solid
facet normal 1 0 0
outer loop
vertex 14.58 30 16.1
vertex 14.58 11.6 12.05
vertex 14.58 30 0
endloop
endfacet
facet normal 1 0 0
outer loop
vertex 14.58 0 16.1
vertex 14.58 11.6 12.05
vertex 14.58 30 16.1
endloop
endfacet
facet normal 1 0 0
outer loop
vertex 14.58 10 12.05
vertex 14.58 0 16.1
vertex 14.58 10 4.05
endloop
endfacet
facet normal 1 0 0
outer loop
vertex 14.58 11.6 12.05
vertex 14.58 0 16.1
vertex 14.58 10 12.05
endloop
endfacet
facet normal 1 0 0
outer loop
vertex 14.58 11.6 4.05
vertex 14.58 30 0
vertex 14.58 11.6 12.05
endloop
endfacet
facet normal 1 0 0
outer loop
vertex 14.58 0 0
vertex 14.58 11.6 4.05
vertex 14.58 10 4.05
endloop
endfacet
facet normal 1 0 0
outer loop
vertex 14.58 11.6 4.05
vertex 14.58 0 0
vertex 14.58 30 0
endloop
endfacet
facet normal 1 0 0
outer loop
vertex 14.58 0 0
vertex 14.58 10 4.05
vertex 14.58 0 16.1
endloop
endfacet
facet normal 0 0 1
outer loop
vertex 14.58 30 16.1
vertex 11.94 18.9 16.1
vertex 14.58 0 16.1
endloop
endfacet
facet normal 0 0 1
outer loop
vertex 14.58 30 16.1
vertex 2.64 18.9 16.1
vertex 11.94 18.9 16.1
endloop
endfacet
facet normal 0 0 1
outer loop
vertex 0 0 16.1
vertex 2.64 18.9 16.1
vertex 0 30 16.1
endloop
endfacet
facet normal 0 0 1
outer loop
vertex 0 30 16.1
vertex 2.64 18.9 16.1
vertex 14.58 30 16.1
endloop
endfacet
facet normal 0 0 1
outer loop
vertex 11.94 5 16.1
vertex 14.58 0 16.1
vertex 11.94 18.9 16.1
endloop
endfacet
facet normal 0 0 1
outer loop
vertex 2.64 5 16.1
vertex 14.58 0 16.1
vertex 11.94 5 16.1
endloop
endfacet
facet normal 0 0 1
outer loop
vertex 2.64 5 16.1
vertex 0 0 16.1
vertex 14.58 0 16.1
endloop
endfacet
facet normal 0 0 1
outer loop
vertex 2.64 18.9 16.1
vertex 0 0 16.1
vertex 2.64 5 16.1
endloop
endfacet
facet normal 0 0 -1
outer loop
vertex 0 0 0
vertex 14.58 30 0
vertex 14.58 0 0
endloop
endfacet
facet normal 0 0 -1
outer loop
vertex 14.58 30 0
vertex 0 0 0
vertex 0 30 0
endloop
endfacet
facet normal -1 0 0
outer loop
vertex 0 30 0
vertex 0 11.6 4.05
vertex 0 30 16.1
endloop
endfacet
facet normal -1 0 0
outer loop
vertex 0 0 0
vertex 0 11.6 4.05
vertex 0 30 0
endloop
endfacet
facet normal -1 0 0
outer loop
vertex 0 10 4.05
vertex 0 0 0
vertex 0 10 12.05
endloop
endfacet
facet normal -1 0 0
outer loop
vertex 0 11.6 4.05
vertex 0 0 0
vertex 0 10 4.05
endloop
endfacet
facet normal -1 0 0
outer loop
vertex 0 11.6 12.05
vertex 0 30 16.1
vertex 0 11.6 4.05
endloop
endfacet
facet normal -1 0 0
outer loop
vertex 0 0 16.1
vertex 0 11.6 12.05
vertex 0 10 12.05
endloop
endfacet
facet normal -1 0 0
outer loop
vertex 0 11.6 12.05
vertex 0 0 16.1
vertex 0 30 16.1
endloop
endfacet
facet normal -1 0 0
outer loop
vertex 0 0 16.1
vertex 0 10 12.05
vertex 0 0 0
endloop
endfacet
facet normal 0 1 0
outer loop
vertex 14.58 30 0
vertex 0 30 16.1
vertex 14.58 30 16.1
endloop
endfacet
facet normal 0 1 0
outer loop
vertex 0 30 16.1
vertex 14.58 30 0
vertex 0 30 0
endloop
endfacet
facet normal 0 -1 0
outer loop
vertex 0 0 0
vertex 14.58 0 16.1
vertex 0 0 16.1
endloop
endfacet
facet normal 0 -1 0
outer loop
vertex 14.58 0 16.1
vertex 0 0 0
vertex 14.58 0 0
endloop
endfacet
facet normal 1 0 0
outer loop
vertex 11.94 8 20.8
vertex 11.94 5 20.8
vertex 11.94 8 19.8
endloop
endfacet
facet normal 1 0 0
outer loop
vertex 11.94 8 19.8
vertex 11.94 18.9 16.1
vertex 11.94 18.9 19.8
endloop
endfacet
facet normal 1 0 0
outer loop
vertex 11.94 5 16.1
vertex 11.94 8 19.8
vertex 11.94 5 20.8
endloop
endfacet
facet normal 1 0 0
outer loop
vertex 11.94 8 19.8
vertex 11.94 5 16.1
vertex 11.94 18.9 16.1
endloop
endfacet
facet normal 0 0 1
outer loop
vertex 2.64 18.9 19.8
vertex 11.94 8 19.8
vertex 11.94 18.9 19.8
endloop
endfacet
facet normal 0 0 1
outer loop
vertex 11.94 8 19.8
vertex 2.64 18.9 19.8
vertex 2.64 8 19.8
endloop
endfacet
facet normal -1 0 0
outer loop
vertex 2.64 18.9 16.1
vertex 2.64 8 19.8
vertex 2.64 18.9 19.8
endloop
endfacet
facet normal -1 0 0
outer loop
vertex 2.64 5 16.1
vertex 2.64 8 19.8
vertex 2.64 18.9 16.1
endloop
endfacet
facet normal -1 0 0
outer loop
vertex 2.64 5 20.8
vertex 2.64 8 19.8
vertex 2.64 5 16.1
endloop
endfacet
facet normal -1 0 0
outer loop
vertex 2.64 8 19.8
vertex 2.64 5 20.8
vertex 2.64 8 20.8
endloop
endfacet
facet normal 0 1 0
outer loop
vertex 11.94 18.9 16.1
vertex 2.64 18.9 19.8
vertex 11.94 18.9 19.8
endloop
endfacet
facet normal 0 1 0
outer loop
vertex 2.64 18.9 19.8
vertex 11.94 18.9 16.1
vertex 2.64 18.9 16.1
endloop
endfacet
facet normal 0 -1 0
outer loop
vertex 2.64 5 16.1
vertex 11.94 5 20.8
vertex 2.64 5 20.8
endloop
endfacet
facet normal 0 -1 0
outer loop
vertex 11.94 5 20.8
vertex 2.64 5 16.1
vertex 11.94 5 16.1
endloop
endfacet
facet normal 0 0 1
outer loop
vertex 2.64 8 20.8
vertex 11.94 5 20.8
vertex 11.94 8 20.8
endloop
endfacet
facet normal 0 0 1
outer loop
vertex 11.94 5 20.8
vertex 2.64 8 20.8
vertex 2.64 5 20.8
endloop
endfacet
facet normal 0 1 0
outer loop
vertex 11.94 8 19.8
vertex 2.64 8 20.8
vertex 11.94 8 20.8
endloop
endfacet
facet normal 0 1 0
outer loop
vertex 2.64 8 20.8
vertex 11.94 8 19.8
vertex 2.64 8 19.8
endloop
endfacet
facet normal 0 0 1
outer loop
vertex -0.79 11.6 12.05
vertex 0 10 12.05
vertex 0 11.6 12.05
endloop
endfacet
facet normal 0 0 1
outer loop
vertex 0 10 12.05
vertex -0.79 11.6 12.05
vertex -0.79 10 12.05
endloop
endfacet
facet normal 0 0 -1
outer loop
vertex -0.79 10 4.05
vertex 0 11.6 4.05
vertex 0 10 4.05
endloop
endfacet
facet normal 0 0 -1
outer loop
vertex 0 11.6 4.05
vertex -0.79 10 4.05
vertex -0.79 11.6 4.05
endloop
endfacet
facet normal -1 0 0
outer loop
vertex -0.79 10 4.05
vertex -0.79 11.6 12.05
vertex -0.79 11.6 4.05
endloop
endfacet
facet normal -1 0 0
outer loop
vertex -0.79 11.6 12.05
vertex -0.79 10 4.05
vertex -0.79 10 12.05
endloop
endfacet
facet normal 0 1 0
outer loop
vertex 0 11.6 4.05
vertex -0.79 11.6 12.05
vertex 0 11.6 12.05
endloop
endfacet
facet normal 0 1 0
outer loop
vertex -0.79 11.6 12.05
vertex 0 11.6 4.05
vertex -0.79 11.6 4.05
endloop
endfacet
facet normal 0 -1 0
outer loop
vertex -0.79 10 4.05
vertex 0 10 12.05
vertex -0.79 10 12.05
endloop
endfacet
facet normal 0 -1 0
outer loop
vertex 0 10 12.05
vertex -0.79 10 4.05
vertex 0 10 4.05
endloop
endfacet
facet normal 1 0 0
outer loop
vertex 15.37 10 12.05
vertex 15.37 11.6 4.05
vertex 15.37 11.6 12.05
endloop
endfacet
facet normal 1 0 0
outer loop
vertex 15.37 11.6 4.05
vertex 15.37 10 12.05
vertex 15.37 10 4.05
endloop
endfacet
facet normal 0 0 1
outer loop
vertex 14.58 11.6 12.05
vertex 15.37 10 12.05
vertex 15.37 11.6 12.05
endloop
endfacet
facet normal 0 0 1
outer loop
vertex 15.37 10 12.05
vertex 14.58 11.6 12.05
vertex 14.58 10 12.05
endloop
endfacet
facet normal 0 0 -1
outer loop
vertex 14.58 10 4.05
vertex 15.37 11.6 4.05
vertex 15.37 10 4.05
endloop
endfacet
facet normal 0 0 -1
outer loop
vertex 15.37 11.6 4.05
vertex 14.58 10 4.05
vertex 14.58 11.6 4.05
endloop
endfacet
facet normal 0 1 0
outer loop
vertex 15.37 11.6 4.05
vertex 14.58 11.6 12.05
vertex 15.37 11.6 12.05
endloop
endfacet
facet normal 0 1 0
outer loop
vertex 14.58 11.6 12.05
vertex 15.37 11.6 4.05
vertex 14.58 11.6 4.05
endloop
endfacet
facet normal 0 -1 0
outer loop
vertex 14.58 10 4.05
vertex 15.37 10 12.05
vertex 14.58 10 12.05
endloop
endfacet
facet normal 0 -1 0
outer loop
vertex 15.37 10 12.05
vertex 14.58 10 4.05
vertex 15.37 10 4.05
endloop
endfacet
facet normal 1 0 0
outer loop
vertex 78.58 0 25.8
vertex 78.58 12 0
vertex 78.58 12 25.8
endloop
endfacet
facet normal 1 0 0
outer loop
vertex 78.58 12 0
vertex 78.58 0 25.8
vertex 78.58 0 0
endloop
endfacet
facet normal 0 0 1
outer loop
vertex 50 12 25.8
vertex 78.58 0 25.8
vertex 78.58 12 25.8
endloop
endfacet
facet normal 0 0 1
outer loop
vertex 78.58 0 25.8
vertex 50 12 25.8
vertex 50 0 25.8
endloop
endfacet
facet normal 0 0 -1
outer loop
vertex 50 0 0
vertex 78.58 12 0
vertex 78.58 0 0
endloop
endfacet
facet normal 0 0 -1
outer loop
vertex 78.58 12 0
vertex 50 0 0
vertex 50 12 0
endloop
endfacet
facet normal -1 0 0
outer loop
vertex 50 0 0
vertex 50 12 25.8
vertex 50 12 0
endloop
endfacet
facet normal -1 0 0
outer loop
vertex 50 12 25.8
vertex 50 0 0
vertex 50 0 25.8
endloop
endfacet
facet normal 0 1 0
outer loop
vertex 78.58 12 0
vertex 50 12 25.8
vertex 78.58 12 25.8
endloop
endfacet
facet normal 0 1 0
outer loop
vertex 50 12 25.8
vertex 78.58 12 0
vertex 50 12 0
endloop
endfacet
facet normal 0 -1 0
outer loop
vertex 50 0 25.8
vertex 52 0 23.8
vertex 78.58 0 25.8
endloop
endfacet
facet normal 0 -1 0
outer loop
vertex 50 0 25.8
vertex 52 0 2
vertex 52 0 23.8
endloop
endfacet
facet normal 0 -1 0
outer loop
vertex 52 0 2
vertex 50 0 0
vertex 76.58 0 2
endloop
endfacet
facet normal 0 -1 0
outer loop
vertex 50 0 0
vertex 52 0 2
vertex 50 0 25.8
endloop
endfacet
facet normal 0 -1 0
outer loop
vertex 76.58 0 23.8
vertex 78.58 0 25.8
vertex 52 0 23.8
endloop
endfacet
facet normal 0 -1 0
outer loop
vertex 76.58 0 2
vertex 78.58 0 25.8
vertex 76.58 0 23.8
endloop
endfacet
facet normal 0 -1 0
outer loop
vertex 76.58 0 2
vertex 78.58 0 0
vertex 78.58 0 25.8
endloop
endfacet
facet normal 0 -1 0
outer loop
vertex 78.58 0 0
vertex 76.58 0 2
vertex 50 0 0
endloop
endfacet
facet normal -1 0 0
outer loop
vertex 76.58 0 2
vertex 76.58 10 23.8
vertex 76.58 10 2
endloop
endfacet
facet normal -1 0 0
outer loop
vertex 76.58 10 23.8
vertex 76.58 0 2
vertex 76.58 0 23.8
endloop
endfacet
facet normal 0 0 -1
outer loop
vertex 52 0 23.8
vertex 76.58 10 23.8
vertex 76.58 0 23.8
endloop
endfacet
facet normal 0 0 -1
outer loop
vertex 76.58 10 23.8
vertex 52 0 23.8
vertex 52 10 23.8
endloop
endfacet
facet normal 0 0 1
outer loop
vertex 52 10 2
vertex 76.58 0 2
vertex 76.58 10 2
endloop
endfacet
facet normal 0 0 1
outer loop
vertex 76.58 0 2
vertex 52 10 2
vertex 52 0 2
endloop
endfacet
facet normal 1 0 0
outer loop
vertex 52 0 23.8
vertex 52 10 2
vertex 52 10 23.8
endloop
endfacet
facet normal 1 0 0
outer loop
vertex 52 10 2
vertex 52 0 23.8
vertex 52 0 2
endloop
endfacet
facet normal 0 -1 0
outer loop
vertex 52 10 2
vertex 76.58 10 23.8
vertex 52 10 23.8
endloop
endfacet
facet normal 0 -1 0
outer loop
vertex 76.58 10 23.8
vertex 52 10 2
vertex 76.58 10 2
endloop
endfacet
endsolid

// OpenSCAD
//keystone for the tray, for routing cables from switch to stuff in the back. Just a cheap amazon keystone.
//
//
//the keystone gets inserted from the rear of the panel, not the front, so the catch clips in, the front stopper should ride
//over the panel front when the catch is squished, then prevent the keystone from being pushed back into the tray.

/*
// next 2 lines used only by my 'on save' script. can be ignored otherwise.
// AUTO-V
version = "v0.1-2026/05/07r18";
*/

ks_width = 14.580;
ks_height = 16.10;
ks_depth = 30.0;
ks_catch_height = 3.7;
ks_catch_width = 9.3;
ks_catch_depth = 13.9;
ks_catch_ypos = 5.0;
ks_catch_edge_depth = 3.0; //the edge part is a tab that sticks up slightly more than the catch
ks_catch_edge_height = 1.0;
ks_side_lip_depth = 1.6;
ks_side_lip_height = 8.0;
ks_side_lip_ypos = 10.0;
ks_side_lip_width = (16.16 - ks_width) / 2;
//there is also a bottom lip, but the catch on top will squish and clip into the case, making the bottom lip a front stopper.
//using this keystone means the front panel is max 2mm thick.

//the panel recess for the keystones, this is because the keystones will otherwise protrude from the front panel.
ks_recess_height = ks_height + ks_catch_height + 2.0; //this is the overall height of the recess in the front panel.
ks_recess_width = ks_width + 10.0; //the overall width of the recess, for multiple this will need adjusting.
ks_recess_depth = ks_side_lip_depth; //how far to recess the keystone into the front panel.
ks_recess_wall_thickness = 2.0; //this is limited by the (ks_catch_ypos+ks_catch_edge_depth)-ks_side_lip_ypos. as the front panel needs to fit between them,

module keystone_panel_recess() {
    difference() {
        cube([ks_recess_width+(ks_recess_wall_thickness * 2), ks_side_lip_ypos+ks_recess_wall_thickness, ks_recess_height+(ks_recess_wall_thickness * 2)]);
        translate([ks_recess_wall_thickness, 0, ks_recess_wall_thickness]) {
            cube([ks_recess_width, ks_side_lip_ypos, ks_recess_height]);
        }
    }
}


module keystone() {
    color("green") {
        cube([ks_width, ks_depth, ks_height]);
    }
    // catch for the keystone to stop it falling out of the tray.
    translate([(ks_width - ks_catch_width)/2, ks_catch_ypos, ks_height]) {
        color("yellow") {
            cube([ks_catch_width, ks_catch_depth, ks_catch_height]);
        }
    }

    //catch edge 
    translate([(ks_width - ks_catch_width)/2, ks_catch_ypos , ks_height + ks_catch_height]) {
        color("yellow") {
            cube([ks_catch_width, ks_catch_edge_depth, ks_catch_edge_height]);
        }
    }


    // side lips for the keystone to help secure it in the tray. left side
    translate([-(ks_side_lip_width), ks_side_lip_ypos, (ks_height / 2)-(ks_side_lip_height/2)]) {
        color("orange") {
            cube([ks_side_lip_width, ks_side_lip_depth, ks_side_lip_height]);
        }
    }
    //right side
    translate([ks_width, ks_side_lip_ypos, (ks_height / 2)-(ks_side_lip_height/2)]) {
        color("orange") {
            cube([ks_side_lip_width, ks_side_lip_depth, ks_side_lip_height]);
        }
    }

}

render() {
    keystone();
    translate([50, 0, 0]) {
        keystone_panel_recess();
    }
}
